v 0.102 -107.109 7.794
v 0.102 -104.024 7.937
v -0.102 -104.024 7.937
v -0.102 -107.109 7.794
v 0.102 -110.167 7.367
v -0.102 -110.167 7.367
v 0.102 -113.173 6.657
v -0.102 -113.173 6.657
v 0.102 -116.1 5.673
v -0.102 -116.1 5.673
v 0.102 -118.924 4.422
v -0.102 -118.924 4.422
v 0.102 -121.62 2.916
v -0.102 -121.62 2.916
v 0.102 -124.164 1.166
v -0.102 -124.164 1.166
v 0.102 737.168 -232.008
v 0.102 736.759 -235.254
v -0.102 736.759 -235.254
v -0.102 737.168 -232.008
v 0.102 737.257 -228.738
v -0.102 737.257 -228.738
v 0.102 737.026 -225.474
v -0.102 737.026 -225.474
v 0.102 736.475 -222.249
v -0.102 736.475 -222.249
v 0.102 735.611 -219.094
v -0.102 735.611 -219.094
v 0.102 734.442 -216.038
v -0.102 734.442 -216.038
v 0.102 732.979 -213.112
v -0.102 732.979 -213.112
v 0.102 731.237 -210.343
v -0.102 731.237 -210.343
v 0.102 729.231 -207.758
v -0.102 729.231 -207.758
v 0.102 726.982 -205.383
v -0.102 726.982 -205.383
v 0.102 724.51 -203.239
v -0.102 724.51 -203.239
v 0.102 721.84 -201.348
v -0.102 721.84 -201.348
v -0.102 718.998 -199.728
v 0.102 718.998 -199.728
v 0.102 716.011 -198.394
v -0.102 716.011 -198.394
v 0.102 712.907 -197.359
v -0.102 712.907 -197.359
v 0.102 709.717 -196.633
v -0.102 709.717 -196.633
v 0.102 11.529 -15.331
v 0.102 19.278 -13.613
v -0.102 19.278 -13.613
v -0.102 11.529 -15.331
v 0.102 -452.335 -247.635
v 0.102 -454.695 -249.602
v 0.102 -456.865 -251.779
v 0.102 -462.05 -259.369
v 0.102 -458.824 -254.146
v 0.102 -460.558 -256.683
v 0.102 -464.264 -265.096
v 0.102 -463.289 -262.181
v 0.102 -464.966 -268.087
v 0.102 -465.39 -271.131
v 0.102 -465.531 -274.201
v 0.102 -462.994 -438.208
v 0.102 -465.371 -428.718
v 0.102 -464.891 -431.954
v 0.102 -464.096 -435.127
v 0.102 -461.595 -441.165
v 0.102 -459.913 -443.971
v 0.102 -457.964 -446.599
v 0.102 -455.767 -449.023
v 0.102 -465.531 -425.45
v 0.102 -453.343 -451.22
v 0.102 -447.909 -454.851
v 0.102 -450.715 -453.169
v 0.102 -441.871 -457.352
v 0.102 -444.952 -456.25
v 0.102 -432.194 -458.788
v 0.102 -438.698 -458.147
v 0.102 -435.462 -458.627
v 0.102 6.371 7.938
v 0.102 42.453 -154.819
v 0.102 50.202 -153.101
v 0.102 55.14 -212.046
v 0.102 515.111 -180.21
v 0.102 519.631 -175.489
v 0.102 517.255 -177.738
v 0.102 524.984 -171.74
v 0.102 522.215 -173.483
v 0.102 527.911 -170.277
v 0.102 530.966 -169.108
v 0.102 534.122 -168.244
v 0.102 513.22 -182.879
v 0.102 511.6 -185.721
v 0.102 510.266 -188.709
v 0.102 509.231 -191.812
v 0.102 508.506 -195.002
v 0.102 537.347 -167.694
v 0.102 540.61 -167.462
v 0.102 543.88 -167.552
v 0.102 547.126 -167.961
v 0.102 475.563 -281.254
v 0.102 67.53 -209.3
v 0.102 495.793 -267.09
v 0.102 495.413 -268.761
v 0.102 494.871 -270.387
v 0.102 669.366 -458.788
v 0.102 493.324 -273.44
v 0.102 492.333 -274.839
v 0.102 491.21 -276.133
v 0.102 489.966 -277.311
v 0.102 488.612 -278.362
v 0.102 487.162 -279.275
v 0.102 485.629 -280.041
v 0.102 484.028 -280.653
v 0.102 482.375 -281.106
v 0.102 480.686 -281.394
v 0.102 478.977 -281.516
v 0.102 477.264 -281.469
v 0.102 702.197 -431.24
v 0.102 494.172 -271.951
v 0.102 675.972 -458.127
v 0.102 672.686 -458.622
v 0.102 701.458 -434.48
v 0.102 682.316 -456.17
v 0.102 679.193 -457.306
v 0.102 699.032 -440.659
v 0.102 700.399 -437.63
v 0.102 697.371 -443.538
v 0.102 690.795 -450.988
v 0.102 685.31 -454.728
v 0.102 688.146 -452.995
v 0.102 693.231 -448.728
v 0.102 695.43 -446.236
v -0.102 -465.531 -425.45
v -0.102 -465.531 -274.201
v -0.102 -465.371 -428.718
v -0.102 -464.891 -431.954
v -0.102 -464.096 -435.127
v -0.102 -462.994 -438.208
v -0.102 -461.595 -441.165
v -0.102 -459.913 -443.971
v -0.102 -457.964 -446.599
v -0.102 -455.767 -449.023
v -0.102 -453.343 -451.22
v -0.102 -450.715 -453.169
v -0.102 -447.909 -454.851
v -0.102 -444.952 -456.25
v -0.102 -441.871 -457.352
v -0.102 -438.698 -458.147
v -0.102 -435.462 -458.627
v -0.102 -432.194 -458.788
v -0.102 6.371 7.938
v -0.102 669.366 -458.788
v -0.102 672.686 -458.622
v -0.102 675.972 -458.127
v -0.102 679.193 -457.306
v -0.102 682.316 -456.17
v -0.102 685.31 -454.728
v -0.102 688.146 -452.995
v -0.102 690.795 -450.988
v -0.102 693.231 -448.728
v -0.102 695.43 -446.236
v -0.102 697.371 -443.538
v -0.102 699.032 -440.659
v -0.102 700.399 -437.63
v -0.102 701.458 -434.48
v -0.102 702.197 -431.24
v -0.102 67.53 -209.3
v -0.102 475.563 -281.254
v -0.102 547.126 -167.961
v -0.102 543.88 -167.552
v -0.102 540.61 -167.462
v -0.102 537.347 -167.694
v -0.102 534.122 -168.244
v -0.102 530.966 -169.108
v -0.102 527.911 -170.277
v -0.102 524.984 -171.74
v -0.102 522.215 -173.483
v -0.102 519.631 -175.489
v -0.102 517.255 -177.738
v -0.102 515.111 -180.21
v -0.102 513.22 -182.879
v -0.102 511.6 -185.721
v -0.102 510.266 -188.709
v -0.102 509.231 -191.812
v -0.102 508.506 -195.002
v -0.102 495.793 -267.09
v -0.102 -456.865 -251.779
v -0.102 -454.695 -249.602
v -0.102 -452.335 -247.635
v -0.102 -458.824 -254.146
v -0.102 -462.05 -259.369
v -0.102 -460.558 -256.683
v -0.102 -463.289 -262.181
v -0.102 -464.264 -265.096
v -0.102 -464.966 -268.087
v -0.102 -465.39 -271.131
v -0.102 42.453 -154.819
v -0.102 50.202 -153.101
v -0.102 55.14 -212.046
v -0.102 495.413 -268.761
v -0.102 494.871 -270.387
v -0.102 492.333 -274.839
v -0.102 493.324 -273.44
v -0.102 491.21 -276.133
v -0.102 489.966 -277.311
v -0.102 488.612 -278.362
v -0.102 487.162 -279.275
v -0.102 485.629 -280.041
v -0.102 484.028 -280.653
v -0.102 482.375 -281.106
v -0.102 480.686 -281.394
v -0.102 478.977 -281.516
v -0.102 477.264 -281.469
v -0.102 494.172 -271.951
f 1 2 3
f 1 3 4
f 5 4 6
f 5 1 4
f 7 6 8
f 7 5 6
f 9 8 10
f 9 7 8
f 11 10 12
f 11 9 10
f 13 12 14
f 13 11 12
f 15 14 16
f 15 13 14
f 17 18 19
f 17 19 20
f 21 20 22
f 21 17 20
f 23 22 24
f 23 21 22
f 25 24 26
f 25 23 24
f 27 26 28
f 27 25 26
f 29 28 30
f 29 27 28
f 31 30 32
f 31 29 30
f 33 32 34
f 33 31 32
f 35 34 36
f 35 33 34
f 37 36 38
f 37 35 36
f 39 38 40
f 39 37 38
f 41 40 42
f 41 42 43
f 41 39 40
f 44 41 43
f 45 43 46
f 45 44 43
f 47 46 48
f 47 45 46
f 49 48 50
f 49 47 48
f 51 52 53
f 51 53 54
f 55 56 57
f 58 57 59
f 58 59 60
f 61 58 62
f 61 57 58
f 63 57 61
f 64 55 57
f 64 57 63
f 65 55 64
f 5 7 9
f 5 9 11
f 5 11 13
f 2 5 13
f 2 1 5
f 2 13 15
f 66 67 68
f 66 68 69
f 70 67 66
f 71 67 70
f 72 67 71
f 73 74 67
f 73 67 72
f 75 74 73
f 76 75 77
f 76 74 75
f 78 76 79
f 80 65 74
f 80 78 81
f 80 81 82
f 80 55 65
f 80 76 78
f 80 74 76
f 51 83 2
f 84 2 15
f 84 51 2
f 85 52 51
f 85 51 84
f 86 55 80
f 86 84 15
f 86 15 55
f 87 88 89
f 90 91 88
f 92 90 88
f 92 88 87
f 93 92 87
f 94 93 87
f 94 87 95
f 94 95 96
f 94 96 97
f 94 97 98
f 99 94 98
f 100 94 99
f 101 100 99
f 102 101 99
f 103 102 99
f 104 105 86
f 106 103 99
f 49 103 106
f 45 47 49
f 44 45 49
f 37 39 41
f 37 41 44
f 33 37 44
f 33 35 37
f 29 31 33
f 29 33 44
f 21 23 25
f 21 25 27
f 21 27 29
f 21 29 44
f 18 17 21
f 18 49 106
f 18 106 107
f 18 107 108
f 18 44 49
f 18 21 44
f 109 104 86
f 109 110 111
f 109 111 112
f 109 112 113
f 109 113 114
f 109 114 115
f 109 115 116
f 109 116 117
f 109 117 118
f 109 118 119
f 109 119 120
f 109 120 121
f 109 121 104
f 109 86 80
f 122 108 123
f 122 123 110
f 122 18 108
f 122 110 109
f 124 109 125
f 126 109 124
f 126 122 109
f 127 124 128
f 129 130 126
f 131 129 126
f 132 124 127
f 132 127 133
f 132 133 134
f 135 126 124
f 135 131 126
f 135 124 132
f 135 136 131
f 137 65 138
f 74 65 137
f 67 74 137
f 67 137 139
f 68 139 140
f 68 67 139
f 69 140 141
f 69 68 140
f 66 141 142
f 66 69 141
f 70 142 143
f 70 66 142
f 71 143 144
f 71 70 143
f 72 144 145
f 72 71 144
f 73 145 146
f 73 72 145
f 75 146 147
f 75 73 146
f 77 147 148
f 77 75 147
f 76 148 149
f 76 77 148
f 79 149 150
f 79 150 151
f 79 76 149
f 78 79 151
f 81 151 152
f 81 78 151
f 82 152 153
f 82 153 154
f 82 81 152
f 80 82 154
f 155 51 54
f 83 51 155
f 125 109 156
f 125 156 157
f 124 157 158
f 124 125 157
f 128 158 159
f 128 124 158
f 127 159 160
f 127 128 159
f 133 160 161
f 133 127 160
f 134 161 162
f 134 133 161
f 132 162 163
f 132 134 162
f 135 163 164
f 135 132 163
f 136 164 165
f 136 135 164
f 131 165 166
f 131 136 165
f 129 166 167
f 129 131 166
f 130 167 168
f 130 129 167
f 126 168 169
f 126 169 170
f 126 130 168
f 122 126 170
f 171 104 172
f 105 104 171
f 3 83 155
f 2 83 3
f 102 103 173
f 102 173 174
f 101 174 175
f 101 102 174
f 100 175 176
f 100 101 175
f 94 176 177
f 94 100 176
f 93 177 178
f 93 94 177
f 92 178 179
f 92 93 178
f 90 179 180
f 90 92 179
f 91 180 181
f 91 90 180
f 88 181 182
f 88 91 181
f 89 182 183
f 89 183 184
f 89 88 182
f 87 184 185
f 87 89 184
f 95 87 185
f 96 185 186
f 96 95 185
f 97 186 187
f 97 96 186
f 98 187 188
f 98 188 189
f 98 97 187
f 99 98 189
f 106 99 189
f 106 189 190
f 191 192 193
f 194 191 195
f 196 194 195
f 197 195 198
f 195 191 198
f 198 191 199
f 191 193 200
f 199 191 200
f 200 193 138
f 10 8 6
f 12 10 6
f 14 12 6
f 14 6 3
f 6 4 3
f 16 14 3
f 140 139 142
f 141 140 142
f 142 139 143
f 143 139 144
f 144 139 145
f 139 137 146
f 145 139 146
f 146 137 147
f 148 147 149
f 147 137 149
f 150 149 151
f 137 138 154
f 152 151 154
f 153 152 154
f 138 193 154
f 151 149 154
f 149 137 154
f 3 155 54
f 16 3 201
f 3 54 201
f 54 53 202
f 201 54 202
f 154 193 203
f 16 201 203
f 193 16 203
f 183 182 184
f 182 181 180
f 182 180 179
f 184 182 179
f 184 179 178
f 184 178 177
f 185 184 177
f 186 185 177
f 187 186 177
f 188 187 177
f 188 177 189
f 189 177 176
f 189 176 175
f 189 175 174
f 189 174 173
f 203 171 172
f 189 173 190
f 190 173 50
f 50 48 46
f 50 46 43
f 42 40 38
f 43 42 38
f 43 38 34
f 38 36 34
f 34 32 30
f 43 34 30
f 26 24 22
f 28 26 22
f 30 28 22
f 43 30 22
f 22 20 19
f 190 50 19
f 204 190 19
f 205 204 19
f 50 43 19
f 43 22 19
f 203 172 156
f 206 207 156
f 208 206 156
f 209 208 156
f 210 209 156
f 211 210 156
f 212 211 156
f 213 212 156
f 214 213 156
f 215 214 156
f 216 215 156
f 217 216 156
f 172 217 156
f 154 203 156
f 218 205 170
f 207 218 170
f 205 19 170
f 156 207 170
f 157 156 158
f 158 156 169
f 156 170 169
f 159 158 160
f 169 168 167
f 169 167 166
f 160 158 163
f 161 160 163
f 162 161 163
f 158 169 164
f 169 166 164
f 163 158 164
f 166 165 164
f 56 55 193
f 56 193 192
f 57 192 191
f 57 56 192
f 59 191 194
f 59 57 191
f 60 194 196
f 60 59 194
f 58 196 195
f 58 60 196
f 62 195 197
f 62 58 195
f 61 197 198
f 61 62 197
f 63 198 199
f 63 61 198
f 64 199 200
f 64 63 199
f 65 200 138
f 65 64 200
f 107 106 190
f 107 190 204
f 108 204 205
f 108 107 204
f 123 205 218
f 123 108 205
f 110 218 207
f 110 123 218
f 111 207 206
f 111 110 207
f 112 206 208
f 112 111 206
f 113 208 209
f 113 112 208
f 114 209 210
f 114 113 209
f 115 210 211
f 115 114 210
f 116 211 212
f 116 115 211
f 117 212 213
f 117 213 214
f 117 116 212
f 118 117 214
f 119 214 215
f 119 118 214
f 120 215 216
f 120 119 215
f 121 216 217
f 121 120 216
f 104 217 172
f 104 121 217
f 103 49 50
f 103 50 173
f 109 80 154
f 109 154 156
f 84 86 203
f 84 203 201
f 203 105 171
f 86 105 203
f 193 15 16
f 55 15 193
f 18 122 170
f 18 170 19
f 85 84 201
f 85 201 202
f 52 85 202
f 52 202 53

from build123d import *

# Parameters (mm, degrees)
BOSS_EXTRUDE1_DEPTH = 0.1016
FILLET1_R           = 25.4
BOSS_EXTRUDE2_DEPTH = 0.2032
FILLET2_R           = 6.35
BOSS_EXTRUDE3_DEPTH = 0.2032


with BuildPart() as part:
    # Sketch1 → Boss-Extrude1 (new body, symmetric)
    with BuildSketch(Plane(origin=(0, 0, 0), x_dir=(0, 0, -1), z_dir=(1, 0, 0))):
        Polygon((0, 0), (0, -112.563749307), (261.582885953, -457.593888215), (450.85, -457.593888215), (450.85, 690.679166755), (208.861297127, 733.352902663), (171.366736958, 520.733599781), (293.482501466, 499.198975136), (217.390599948, 67.706860465), (221.513774593, 49.108421529), align=None)
    extrude(amount=BOSS_EXTRUDE1_DEPTH, both=True)

    # Fillet1
    fillet1_edges = [part.edges().sort_by_distance(p)[0] for p in [
        (0, 499.198975136, -293.482501466),
        (0, 520.733599781, -171.366736958),
        (0, 733.352902663, -208.861297127),
        (0, 690.679166755, -450.85),
        (0, -457.593888215, -450.85),
        (0, -457.593888215, -261.582885953),
        (0, -112.563749307, 0),
    ]]
    fillet(fillet1_edges, radius=FILLET1_R)

    # Sketch5 → Boss-Extrude2 (add)
    with BuildSketch(Plane(origin=(0.1016, 0, 0), x_dir=(0, 0, -1), z_dir=(1, 0, 0))):
        Polygon((24.797918581, 5.497566194), (23.079929145, 13.246915751), (147.069522049, 40.734746721), (148.787511485, 32.985397164), align=None)
    extrude(amount=-BOSS_EXTRUDE2_DEPTH)

    # Fillet2
    fillet2_edges = [part.edges().sort_by_distance(p)[0] for p in [
        (0, 32.985397164, -148.787511485),
        (0, 5.497566194, -24.797918581),
    ]]
    fillet(fillet2_edges, radius=FILLET2_R)

    # Sketch7 → Boss-Extrude3 (add)
    with BuildSketch(Plane(origin=(0.1016, 0, 0), x_dir=(0, 0, -1), z_dir=(1, 0, 0))):
        with BuildLine():
            Line((274.200562117, -465.531388215), (425.45, -465.531388215))
            ThreePointArc((425.45, -465.531388215), (449.023172318, -455.767060533), (458.7875, -432.193888215))
            Line((458.7875, -432.193888215), (458.7875, 669.366434984))
            ThreePointArc((458.7875, 669.366434984), (450.988204091, 690.795131586), (431.239601202, 702.197356752))
            Line((431.239601202, 702.197356752), (235.253809237, 736.758664072))
            ThreePointArc((235.253809237, 736.758664072), (210.34310689, 731.236575989), (196.633286266, 709.717343506))
            Line((196.633286266, 709.717343506), (167.960975549, 547.126111891))
            ThreePointArc((167.960975549, 547.126111891), (173.483063631, 522.215409544), (195.002296115, 508.50558892))
            Line((195.002296115, 508.50558892), (267.089989356, 495.793213726))
            ThreePointArc((267.089989356, 495.793213726), (278.361968276, 488.611879114), (281.254490605, 475.56341598))
            Line((281.254490605, 475.56341598), (209.299504588, 67.530386732))
            Line((209.299504588, 67.530386732), (212.046435601, 55.13978165))
            Line((212.046435601, 55.13978165), (154.818871606, 42.452736156))
            Line((154.818871606, 42.452736156), (153.10088217, 50.202085713))
            Line((153.10088217, 50.202085713), (13.612590153, 19.278275871))
            Line((13.612590153, 19.278275871), (15.330579589, 11.528926315))
            Line((15.330579589, 11.528926315), (-7.9375, 6.37051726))
            Line((-7.9375, 6.37051726), (-7.9375, -104.02374744))
            ThreePointArc((-7.9375, -104.02374744), (-6.199252731, -114.648065445), (-1.165778481, -124.164460435))
            Line((-1.165778481, -124.164460435), (247.634783637, -452.33460121))
            ThreePointArc((247.634783637, -452.33460121), (259.369043538, -462.050461408), (274.200562117, -465.531388215))
        make_face()
    extrude(amount=-BOSS_EXTRUDE3_DEPTH)


solid = part.part
